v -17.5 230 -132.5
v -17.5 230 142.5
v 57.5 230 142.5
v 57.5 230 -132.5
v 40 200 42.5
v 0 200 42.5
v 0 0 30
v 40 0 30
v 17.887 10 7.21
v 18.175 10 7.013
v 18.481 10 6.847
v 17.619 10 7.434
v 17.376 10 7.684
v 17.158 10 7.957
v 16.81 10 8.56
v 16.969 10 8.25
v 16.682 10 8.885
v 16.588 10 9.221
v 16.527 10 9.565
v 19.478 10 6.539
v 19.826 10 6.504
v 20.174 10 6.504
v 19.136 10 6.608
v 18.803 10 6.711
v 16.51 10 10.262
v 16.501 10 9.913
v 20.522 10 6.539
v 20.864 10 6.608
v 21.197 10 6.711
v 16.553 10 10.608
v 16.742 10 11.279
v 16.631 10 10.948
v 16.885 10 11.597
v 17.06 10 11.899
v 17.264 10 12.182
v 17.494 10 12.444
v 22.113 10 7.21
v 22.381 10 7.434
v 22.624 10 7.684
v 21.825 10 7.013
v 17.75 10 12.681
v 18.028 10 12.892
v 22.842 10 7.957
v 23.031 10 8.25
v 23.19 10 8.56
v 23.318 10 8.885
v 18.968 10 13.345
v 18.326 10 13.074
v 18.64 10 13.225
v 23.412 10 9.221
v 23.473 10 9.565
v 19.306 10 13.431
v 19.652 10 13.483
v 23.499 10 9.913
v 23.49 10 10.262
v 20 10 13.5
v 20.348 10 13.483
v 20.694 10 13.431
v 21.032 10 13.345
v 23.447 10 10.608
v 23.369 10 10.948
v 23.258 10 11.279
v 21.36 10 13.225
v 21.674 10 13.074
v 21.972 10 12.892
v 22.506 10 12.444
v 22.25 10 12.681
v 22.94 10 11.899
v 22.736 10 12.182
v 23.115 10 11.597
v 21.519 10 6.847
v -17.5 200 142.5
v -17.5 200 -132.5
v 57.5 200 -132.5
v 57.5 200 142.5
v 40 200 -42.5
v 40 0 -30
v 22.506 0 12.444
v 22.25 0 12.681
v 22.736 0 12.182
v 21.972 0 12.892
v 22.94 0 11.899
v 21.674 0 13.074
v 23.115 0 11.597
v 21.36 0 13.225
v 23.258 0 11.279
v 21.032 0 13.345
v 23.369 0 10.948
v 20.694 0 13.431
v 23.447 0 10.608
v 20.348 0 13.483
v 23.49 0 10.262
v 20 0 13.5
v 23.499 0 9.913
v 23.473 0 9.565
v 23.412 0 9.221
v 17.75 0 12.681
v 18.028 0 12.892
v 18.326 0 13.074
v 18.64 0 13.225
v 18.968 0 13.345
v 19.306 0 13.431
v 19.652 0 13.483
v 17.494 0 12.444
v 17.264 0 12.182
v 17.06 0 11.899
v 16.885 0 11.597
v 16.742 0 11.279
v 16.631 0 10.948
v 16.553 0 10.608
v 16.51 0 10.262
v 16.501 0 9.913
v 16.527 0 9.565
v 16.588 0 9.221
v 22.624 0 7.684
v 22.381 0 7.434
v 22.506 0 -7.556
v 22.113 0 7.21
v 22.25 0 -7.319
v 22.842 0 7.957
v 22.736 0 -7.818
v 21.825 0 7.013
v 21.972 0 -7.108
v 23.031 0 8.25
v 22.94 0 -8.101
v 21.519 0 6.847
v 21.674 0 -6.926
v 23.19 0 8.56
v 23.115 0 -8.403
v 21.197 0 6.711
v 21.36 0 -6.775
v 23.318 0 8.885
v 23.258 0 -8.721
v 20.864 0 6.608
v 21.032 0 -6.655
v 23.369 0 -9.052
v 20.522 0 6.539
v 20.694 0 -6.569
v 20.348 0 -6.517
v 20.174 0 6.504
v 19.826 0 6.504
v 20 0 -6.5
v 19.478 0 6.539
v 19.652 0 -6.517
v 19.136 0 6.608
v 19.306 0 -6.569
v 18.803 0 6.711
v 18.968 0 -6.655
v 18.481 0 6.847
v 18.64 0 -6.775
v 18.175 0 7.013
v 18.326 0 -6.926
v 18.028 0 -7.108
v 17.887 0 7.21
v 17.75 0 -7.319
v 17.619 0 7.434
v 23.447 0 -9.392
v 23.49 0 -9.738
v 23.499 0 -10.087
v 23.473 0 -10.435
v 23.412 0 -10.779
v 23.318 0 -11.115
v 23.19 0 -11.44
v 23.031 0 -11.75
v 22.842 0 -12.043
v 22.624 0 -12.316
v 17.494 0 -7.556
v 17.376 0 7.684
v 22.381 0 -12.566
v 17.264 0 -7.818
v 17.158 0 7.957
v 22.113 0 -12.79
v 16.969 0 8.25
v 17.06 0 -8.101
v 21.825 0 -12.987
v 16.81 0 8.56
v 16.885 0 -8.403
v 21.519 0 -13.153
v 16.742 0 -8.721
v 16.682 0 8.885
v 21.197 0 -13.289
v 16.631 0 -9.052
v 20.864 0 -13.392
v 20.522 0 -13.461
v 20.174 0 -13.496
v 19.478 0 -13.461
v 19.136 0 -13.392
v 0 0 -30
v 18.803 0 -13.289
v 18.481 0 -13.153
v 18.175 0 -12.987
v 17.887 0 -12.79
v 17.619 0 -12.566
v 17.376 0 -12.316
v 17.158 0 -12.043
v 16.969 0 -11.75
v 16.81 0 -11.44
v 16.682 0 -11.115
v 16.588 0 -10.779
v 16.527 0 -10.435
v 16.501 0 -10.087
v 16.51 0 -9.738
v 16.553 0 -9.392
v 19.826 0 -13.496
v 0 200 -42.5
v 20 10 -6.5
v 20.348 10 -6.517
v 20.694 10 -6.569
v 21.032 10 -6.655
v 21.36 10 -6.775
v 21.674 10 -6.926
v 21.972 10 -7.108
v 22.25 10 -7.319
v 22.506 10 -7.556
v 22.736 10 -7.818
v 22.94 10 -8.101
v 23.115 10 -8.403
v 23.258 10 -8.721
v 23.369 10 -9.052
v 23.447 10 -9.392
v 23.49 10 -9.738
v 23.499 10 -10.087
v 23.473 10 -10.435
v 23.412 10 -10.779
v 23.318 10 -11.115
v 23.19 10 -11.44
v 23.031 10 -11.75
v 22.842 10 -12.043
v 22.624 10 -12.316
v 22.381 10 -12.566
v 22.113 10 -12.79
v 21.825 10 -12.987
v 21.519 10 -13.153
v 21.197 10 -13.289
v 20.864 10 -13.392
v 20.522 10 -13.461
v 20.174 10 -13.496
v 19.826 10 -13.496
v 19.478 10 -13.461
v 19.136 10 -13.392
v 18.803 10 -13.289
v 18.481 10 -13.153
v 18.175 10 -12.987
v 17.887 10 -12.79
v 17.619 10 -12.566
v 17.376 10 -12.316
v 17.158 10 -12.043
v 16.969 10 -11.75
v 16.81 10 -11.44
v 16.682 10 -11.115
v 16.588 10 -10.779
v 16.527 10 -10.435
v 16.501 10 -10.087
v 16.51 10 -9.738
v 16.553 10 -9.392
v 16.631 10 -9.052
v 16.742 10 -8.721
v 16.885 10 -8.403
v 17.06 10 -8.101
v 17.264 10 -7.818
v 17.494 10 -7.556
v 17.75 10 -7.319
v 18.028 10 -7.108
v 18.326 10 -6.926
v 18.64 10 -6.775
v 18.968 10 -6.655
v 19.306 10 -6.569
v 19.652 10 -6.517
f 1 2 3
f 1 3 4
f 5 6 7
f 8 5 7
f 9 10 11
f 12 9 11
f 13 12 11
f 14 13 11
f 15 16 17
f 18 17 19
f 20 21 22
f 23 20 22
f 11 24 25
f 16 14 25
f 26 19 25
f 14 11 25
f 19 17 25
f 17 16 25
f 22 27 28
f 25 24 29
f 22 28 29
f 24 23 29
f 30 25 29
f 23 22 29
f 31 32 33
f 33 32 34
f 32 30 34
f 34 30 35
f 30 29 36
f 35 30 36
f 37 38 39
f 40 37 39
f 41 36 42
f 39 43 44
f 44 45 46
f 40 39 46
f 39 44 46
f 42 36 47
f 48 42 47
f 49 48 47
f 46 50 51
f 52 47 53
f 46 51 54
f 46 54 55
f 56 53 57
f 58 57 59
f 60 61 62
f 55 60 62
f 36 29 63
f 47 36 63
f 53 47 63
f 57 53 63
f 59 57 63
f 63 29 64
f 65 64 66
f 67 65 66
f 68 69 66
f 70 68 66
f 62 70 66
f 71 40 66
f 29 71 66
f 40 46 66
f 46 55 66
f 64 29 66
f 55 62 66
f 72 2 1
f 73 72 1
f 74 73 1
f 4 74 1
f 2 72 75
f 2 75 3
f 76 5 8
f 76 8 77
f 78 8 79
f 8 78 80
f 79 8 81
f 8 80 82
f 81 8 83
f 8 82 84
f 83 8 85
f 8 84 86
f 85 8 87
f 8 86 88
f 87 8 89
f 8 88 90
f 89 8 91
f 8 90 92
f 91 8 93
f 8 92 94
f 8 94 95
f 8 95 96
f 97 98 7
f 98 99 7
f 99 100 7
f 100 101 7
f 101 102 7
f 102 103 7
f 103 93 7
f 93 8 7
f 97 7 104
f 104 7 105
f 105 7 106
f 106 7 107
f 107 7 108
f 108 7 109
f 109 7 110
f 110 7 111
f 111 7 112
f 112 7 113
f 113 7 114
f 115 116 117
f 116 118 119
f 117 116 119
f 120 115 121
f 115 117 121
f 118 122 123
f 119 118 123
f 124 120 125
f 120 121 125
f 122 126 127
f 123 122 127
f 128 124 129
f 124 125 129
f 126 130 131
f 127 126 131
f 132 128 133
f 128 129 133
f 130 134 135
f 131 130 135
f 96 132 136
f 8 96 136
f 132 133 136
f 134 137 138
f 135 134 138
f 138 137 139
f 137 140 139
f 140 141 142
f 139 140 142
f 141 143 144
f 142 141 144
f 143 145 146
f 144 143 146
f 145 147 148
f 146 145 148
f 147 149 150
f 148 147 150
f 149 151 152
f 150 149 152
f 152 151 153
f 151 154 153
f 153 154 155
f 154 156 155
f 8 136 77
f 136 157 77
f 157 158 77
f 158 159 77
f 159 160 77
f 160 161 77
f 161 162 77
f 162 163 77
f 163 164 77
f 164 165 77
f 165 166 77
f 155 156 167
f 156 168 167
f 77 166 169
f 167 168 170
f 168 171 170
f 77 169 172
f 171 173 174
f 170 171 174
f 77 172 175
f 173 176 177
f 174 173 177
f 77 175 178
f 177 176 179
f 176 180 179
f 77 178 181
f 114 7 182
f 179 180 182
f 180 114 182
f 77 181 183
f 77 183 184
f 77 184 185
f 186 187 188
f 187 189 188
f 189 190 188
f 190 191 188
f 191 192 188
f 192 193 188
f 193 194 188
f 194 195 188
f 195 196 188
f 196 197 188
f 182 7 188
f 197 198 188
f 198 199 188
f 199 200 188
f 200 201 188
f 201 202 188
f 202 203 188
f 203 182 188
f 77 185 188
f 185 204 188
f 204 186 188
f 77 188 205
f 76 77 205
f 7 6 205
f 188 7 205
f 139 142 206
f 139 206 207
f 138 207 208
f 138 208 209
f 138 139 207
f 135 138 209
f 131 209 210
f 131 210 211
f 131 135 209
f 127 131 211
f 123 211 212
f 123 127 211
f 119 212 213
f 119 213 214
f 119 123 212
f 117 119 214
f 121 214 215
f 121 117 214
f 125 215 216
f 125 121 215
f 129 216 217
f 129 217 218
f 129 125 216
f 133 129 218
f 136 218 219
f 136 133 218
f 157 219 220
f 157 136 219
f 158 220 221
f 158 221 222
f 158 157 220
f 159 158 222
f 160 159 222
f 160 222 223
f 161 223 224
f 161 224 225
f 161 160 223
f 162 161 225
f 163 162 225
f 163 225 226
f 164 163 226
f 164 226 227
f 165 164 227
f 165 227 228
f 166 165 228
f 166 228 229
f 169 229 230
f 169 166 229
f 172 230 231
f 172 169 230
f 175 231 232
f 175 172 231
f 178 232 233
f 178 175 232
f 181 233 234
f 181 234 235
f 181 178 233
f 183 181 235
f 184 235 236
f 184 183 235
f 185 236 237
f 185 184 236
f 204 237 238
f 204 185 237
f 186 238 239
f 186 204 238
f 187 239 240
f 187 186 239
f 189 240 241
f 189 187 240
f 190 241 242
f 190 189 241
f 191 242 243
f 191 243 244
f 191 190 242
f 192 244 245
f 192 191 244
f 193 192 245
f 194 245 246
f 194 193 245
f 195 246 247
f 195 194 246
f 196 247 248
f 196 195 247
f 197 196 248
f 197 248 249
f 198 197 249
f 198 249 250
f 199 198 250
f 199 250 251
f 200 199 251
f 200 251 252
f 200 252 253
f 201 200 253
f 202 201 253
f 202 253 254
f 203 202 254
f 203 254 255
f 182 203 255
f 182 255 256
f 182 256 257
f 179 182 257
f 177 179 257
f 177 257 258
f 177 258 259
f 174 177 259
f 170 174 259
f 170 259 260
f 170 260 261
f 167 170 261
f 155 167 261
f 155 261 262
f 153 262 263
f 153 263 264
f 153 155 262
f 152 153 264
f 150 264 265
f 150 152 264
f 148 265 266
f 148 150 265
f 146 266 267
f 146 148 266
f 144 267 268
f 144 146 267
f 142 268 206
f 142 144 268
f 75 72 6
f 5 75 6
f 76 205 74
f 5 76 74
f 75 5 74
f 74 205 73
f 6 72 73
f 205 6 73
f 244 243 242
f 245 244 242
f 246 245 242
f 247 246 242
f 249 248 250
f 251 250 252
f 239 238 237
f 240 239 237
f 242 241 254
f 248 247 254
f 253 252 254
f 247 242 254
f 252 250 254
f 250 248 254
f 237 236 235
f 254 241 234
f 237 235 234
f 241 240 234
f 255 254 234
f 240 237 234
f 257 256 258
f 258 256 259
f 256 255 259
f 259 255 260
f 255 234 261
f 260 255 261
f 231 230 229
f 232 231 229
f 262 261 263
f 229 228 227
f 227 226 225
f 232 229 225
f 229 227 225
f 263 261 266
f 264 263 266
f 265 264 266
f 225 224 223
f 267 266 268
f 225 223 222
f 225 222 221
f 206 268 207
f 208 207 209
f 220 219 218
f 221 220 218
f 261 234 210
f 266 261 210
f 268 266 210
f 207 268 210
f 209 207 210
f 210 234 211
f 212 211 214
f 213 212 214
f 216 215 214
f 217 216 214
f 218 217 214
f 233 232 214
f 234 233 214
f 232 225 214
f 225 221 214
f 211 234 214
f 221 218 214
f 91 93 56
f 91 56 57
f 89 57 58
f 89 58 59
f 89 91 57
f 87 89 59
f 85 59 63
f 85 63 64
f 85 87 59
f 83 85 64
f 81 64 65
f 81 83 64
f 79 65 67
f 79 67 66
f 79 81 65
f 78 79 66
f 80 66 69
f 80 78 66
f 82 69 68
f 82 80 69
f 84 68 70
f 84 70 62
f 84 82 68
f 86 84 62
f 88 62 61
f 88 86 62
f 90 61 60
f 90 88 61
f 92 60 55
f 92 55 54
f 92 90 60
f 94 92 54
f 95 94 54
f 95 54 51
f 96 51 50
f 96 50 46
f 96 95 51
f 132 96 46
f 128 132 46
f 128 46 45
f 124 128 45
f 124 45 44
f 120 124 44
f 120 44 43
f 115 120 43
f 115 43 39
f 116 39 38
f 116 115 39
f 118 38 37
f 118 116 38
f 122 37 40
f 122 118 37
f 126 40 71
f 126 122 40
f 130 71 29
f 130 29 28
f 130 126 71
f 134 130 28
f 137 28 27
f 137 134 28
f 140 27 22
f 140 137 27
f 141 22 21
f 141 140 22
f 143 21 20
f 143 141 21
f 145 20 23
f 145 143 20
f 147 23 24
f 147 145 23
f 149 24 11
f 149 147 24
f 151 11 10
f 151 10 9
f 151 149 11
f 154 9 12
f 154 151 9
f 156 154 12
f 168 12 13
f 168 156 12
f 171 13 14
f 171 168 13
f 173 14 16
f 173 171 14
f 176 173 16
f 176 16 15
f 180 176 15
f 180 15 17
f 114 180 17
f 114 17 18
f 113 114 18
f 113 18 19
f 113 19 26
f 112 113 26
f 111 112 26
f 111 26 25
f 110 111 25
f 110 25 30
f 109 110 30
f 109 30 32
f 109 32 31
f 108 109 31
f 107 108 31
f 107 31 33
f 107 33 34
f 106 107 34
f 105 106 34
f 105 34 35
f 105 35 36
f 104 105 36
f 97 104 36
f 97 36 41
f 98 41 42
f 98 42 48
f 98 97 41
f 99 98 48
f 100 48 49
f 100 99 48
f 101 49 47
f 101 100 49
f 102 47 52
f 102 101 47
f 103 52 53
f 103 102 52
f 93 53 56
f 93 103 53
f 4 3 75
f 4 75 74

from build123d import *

# Parameters (mm, degrees)
BOSS_EXTRUDE1_DEPTH = 40
BOSS_EXTRUDE2_START = -17.5
SKETCH2_W           = 275
SKETCH2_H           = 30
BOSS_EXTRUDE2_DEPTH = 75
SKETCH4_R           = 3.5
CUT_EXTRUDE1_DEPTH  = 10


with BuildPart() as part:
    # Sketch1 → Boss-Extrude1 (new body)
    with BuildSketch(Plane(origin=(0, 0, 0), x_dir=(0, 0, -1), z_dir=(1, 0, 0))):
        Polygon((-30, 0), (30, 0), (42.5, 200), (132.5, 200), (132.5, 230), (-142.5, 230), (-142.5, 200), (-42.5, 200), align=None)
    extrude(amount=BOSS_EXTRUDE1_DEPTH)

    # Sketch2 → Boss-Extrude2 (add)
    with BuildSketch(Plane(origin=(0, 0, 0), x_dir=(0, 0, -1), z_dir=(1, 0, 0)).offset(BOSS_EXTRUDE2_START)):
        with Locations((-5, 215)):
            Rectangle(SKETCH2_W, SKETCH2_H)
    extrude(amount=BOSS_EXTRUDE2_DEPTH)

    # Sketch4 → Cut-Extrude1 (cut)
    with BuildSketch(Plane(origin=(0, 0, 0), x_dir=(1, 0, 0), z_dir=(0, 1, 0))):
        with Locations(Location((20, -10, 0), (0, 0, 270))):
            Circle(SKETCH4_R)
        with Locations(Location((20, 10, 0), (0, 0, 270))):
            Circle(SKETCH4_R)
    extrude(amount=CUT_EXTRUDE1_DEPTH, mode=Mode.SUBTRACT)


solid = part.part
